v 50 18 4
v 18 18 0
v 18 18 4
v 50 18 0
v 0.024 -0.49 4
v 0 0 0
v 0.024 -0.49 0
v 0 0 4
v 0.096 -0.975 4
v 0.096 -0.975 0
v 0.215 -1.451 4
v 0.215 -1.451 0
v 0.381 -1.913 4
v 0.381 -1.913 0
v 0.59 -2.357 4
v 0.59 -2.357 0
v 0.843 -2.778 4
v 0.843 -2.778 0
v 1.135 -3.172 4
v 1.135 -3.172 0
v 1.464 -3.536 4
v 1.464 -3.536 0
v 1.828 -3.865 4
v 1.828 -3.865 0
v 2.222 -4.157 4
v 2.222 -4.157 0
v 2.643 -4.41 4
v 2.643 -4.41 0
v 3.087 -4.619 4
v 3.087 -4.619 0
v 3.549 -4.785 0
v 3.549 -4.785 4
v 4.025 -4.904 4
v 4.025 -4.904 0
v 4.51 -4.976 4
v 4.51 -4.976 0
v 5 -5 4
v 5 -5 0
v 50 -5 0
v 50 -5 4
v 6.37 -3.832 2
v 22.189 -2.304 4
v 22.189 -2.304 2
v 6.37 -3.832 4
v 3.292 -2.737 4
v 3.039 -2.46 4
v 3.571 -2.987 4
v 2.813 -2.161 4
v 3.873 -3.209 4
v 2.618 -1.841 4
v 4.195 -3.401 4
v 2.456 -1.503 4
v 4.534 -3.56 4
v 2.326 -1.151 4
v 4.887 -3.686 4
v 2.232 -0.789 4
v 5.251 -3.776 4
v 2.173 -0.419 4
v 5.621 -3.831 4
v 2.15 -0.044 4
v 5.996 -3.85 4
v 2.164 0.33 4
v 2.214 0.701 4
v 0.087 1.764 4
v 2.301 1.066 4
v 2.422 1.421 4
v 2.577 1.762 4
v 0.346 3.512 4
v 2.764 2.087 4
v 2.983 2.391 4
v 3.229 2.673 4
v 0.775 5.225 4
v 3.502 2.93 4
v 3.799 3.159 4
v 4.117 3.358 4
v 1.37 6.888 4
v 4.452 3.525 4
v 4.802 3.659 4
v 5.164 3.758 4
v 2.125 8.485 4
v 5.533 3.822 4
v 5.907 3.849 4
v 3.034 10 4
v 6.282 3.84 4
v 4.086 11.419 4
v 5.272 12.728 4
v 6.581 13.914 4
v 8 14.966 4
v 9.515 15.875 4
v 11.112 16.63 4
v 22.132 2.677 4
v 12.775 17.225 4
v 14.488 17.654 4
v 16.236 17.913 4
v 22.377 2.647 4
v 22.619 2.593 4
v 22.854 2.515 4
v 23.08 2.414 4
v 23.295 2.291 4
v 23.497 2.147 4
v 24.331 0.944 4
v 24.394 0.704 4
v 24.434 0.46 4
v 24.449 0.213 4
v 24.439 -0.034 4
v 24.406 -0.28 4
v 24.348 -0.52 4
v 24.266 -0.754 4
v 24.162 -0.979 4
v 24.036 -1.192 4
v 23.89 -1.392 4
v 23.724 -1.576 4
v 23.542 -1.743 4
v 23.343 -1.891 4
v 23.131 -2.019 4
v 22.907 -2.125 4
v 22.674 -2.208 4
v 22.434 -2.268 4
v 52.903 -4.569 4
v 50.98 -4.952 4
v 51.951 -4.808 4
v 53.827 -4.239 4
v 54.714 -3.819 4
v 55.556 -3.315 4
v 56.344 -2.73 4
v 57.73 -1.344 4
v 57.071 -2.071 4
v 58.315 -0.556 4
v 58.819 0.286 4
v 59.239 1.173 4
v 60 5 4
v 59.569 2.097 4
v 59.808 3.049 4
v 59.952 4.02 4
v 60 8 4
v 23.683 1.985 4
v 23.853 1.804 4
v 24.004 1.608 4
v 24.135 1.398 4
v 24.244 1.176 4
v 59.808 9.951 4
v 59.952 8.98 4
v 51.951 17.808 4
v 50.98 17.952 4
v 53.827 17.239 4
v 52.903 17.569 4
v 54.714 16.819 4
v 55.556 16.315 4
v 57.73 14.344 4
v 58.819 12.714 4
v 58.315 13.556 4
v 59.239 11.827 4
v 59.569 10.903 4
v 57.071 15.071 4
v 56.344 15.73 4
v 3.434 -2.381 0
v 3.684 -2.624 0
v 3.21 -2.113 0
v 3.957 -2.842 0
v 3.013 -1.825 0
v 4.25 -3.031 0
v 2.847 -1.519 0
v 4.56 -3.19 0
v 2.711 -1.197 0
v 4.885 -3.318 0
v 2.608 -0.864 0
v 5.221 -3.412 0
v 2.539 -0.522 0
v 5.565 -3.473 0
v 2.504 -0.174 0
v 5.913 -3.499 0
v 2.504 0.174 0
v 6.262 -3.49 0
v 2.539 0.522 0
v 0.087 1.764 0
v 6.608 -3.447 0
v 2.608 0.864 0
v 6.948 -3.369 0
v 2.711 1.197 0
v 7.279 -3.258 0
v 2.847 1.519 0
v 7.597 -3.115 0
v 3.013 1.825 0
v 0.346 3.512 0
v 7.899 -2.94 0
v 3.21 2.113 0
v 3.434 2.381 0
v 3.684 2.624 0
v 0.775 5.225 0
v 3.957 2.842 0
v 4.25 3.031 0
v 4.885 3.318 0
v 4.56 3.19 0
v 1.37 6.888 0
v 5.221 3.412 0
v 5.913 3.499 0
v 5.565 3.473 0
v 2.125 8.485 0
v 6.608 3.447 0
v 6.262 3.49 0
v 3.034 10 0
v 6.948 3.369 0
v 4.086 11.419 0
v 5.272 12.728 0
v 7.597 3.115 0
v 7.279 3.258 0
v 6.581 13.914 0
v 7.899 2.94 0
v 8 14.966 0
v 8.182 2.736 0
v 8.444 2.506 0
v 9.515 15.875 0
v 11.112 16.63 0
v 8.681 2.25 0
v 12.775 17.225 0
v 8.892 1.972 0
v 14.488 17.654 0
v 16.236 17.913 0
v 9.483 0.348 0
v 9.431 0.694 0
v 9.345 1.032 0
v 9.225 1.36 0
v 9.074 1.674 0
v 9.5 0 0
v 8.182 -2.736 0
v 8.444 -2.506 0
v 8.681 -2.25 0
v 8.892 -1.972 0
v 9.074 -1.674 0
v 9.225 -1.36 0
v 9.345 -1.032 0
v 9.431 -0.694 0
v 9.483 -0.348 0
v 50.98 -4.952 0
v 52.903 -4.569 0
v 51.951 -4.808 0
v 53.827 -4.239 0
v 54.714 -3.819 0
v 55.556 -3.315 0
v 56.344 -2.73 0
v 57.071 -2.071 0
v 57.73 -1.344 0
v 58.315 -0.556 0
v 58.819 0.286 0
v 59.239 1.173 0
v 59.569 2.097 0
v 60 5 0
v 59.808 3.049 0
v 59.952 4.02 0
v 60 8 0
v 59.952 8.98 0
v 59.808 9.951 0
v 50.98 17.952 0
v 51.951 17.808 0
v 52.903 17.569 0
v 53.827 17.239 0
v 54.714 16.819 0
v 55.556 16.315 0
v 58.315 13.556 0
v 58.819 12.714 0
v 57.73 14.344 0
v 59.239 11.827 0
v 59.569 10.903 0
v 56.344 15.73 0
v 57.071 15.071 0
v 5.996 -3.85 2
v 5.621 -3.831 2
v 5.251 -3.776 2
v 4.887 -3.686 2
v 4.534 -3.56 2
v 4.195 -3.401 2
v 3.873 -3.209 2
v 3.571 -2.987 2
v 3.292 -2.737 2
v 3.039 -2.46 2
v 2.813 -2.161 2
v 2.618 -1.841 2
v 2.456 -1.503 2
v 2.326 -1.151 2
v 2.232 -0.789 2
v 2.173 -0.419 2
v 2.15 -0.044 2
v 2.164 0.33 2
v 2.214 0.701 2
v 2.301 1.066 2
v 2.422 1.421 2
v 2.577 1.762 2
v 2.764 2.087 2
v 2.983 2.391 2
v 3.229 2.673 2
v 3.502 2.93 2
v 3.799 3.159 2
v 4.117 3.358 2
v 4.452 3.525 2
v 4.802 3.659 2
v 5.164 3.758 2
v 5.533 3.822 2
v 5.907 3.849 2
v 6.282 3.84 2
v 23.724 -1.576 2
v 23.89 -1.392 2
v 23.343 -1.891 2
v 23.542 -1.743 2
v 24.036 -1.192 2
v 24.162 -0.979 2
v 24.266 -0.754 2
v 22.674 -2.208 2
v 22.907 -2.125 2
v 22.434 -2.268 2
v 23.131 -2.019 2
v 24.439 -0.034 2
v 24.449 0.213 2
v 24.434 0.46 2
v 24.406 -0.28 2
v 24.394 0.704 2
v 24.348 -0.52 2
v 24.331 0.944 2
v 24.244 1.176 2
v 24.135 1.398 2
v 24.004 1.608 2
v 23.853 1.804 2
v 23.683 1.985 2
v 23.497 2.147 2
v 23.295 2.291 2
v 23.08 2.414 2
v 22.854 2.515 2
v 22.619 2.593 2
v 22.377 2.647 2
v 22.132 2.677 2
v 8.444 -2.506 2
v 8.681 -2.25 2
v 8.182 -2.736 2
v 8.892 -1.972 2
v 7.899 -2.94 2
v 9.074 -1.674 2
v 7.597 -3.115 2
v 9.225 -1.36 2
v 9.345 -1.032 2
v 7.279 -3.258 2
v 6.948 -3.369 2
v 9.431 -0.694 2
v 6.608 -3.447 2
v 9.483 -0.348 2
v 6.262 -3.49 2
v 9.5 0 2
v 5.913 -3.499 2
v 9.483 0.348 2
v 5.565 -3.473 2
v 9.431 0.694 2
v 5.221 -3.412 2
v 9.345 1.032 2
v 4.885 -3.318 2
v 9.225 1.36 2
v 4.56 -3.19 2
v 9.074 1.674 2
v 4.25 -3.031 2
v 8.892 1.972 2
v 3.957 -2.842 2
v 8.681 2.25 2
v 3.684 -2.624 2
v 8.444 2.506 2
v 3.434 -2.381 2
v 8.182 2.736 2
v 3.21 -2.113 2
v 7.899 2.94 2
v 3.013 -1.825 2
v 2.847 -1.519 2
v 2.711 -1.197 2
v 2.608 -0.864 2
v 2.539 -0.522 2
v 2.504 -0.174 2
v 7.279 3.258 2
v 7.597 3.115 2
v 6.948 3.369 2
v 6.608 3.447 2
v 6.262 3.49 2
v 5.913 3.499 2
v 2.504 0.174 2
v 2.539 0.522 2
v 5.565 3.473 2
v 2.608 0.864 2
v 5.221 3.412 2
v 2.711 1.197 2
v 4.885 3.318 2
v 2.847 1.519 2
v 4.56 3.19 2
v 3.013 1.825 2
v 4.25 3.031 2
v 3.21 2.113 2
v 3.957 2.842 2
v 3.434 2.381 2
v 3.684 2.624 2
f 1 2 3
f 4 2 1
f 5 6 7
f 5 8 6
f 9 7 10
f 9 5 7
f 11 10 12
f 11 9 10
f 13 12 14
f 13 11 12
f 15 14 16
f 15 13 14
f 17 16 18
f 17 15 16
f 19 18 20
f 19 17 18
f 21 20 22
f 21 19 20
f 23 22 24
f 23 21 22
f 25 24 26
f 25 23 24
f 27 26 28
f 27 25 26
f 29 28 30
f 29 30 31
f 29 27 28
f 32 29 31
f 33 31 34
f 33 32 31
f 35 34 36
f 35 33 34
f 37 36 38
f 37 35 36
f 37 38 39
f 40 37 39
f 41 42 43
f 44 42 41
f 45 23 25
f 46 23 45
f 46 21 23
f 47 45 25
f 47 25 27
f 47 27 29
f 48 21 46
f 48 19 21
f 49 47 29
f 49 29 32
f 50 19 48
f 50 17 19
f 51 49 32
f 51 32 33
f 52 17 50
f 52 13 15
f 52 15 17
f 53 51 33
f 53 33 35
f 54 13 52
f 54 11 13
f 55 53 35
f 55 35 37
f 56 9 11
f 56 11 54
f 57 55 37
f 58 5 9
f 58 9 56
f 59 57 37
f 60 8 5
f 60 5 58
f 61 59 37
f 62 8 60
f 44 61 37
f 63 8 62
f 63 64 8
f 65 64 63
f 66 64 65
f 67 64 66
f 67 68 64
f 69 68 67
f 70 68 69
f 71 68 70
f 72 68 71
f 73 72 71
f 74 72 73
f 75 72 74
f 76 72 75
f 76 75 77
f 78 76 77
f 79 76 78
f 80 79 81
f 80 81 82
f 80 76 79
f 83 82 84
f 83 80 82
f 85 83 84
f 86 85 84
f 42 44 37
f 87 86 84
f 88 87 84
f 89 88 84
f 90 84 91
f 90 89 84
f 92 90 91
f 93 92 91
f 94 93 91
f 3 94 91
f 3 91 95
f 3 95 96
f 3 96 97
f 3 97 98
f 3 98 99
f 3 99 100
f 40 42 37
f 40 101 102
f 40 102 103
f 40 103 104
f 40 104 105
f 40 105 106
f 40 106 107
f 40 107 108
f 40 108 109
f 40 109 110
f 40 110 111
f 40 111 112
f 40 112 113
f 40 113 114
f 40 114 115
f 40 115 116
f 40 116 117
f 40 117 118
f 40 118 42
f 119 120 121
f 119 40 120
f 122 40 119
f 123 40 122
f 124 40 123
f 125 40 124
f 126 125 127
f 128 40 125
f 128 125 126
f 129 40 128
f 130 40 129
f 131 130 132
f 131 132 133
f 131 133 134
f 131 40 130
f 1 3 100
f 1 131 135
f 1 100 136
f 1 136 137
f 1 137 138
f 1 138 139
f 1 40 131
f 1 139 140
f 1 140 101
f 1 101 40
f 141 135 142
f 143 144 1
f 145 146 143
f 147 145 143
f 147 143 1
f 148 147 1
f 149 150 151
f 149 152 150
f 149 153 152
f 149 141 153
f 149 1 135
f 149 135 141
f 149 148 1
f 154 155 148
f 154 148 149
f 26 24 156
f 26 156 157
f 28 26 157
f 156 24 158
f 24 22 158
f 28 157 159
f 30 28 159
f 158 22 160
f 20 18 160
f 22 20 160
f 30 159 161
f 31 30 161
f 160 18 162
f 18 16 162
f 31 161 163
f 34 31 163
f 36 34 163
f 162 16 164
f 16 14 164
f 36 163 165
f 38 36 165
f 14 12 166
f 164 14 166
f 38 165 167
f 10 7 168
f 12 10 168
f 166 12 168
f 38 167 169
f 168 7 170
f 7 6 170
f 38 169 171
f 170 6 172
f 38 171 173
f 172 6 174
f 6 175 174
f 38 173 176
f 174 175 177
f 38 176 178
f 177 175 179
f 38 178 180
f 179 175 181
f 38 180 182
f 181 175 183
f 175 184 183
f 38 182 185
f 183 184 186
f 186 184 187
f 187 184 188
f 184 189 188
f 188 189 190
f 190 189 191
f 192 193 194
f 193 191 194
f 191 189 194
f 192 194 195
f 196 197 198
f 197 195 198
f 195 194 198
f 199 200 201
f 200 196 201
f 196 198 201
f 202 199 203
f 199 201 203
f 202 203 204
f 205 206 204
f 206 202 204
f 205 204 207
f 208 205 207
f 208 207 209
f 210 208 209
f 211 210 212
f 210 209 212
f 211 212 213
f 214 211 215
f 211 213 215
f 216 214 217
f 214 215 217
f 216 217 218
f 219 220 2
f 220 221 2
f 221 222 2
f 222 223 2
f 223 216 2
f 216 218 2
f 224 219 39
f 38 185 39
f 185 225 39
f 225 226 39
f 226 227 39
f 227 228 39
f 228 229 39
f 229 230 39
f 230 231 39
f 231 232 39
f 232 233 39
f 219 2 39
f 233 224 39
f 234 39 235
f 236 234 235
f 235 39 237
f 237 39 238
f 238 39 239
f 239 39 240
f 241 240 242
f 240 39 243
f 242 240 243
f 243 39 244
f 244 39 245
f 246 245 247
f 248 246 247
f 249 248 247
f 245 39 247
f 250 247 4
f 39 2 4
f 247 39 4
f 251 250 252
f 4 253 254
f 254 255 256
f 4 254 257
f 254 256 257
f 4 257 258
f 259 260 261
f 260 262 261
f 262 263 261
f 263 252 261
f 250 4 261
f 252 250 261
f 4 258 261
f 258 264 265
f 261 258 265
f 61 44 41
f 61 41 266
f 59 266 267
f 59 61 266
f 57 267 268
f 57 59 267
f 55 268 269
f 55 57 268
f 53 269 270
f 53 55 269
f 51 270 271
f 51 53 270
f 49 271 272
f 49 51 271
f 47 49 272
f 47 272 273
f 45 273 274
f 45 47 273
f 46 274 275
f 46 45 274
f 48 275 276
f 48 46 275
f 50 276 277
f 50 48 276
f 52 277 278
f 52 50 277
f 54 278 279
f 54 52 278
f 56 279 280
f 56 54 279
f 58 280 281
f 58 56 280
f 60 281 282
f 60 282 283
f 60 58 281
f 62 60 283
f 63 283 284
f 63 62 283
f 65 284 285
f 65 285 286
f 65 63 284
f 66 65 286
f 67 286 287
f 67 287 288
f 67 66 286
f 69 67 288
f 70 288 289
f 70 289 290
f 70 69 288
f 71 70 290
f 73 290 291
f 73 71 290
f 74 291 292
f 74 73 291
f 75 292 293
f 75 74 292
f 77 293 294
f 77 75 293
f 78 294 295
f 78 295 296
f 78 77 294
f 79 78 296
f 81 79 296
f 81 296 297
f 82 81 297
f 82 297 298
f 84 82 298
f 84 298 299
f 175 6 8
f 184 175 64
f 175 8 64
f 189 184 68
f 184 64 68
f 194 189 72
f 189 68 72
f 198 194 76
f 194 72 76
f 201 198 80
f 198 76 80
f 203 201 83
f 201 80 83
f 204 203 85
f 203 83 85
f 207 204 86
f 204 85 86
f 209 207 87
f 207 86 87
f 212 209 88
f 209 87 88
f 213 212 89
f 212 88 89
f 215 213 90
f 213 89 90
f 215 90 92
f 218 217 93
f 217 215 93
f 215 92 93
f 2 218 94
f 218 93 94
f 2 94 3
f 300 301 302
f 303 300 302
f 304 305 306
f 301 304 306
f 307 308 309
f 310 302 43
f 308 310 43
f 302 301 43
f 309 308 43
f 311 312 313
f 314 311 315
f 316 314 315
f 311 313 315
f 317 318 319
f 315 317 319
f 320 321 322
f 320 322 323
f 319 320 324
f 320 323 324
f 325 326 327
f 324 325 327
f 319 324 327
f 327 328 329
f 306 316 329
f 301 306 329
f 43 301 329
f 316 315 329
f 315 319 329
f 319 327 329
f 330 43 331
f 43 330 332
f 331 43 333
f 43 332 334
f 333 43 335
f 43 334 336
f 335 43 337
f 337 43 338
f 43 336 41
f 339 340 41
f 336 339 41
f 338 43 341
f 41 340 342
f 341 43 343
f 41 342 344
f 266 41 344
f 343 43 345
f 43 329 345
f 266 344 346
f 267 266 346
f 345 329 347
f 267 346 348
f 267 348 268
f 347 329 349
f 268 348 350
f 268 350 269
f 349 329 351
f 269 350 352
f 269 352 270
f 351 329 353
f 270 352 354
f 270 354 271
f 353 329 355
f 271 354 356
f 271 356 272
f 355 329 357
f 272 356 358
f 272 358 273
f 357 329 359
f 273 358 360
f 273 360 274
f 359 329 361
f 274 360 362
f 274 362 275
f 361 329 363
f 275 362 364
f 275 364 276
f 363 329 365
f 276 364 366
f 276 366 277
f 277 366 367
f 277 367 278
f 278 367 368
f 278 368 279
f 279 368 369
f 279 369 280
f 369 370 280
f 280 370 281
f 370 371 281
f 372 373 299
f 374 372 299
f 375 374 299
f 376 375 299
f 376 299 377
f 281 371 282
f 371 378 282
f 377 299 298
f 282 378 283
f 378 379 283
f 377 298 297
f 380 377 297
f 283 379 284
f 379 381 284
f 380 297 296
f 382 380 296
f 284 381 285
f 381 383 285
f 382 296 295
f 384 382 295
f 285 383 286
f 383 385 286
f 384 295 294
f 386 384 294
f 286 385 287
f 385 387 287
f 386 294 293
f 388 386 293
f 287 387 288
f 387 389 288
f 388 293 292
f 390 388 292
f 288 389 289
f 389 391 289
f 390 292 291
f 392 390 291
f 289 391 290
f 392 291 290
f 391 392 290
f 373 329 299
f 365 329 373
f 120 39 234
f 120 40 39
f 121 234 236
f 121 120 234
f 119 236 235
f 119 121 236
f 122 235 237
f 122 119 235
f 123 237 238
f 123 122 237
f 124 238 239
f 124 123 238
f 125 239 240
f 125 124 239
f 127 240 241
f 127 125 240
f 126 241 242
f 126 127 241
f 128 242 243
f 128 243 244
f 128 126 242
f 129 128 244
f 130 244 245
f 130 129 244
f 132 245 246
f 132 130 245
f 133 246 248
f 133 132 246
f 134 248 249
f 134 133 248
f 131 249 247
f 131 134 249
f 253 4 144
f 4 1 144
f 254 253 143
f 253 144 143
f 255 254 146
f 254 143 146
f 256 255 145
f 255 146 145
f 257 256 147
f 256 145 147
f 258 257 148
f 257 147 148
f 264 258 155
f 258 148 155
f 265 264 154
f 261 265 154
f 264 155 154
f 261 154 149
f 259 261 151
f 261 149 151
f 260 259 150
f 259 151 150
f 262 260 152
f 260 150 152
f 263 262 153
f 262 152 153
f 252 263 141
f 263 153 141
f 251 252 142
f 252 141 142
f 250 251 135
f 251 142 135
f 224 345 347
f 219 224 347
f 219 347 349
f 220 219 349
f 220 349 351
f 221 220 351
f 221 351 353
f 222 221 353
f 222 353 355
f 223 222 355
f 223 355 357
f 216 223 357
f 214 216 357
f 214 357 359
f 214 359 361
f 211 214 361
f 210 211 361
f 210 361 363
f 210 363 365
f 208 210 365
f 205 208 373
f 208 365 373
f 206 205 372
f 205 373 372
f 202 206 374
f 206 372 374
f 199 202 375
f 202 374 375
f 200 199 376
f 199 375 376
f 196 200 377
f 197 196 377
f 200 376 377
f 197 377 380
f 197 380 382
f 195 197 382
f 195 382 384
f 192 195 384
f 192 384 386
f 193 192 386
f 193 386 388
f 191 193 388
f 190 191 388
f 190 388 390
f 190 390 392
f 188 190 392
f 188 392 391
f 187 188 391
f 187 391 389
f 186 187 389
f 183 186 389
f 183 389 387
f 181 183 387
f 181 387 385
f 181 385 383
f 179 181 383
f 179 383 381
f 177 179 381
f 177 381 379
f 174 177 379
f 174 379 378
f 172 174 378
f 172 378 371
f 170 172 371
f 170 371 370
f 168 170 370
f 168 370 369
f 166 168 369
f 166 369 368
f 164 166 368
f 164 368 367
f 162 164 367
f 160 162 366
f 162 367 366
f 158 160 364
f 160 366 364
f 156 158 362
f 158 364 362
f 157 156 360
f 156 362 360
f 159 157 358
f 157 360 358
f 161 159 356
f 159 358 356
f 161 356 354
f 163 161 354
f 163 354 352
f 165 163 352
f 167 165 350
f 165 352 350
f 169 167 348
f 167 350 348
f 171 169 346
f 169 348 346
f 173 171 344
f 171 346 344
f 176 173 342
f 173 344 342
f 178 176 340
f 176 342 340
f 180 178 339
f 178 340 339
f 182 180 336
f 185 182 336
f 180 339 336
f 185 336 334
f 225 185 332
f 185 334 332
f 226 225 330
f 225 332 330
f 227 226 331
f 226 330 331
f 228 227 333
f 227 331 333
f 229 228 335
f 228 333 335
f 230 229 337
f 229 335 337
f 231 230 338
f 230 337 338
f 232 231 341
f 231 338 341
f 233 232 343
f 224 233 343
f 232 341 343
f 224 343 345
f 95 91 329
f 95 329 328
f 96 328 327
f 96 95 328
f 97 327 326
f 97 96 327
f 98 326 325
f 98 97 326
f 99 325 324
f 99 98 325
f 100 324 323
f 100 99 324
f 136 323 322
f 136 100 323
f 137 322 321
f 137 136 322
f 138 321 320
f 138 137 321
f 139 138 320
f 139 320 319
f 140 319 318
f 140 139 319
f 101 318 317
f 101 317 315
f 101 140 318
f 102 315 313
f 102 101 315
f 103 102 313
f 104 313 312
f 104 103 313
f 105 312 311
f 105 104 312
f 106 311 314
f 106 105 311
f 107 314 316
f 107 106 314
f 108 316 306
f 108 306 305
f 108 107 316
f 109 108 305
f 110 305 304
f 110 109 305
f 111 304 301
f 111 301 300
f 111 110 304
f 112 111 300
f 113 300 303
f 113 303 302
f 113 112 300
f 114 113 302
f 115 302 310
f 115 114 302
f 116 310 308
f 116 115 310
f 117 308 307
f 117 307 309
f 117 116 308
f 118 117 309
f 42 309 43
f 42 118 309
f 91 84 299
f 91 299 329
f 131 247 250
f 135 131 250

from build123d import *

# Parameters (mm, degrees)
SKIZZE6_W                       = 60
SKIZZE6_H                       = 23
AUFSATZ_LINEAR_AUSTRAGEN1_DEPTH = 4
SKIZZE7_R                       = 3.5
SCHNITT_LINEAR_AUSTRAGEN1_DEPTH = 5
VERRUNDUNG1_R                   = 10
SCHNITT_LINEAR_AUSTRAGEN2_DEPTH = 2
VERRUNDUNG2_R                   = 5
SCHNITT_LINEAR_AUSTRAGEN3_DEPTH = 5


with BuildPart() as part:
    # Skizze6 → Aufsatz-Linear austragen1 (new body)
    with BuildSketch(Plane.XY):
        with Locations((30, 6.5)):
            Rectangle(SKIZZE6_W, SKIZZE6_H)
    extrude(amount=AUFSATZ_LINEAR_AUSTRAGEN1_DEPTH)

    # Skizze7 → Schnitt-Linear austragen1 (cut, through all)
    with BuildSketch(Plane.XY.offset(4)):
        with Locations((6, 0)):
            Circle(SKIZZE7_R)
    extrude(amount=-SCHNITT_LINEAR_AUSTRAGEN1_DEPTH, mode=Mode.SUBTRACT)

    # Verrundung1
    verrundung1_edges = [part.edges().sort_by_distance(p)[0] for p in [
        (0, 18, 2),
        (60, 18, 2),
        (60, -5, 2),
    ]]
    fillet(verrundung1_edges, radius=VERRUNDUNG1_R)

    # Skizze9 → Schnitt-Linear austragen2 (cut)
    with BuildSketch(Plane.XY.offset(4)):
        with BuildLine():
            Line((6.281560008, 3.839690608), (22.131768578, 2.677413406))
            ThreePointArc((22.131768578, 2.677413406), (24.448770853, 0.212964842), (22.189275528, -2.304312884))
            Line((22.189275528, -2.304312884), (6.370120712, -3.83216788))
            ThreePointArc((6.370120712, -3.83216788), (2.150256489, -0.044439818), (6.281560008, 3.839690608))
        make_face()
    extrude(amount=-SCHNITT_LINEAR_AUSTRAGEN2_DEPTH, mode=Mode.SUBTRACT)

    # Verrundung2
    verrundung2_edges = [part.edges().sort_by_distance(p)[0] for p in [
        (0, -5, 2),
    ]]
    fillet(verrundung2_edges, radius=VERRUNDUNG2_R)

    # Skizze10 → Schnitt-Linear austragen3 (cut, through all)
    with BuildSketch(Plane.XY.offset(4)):
        with BuildLine():
            Line((18, 18), (0, 18))
            Line((0, 18), (0, 0))
            ThreePointArc((0, 0), (5.272077939, 12.727922061), (18, 18))
        make_face()
    extrude(amount=-SCHNITT_LINEAR_AUSTRAGEN3_DEPTH, mode=Mode.SUBTRACT)


solid = part.part
